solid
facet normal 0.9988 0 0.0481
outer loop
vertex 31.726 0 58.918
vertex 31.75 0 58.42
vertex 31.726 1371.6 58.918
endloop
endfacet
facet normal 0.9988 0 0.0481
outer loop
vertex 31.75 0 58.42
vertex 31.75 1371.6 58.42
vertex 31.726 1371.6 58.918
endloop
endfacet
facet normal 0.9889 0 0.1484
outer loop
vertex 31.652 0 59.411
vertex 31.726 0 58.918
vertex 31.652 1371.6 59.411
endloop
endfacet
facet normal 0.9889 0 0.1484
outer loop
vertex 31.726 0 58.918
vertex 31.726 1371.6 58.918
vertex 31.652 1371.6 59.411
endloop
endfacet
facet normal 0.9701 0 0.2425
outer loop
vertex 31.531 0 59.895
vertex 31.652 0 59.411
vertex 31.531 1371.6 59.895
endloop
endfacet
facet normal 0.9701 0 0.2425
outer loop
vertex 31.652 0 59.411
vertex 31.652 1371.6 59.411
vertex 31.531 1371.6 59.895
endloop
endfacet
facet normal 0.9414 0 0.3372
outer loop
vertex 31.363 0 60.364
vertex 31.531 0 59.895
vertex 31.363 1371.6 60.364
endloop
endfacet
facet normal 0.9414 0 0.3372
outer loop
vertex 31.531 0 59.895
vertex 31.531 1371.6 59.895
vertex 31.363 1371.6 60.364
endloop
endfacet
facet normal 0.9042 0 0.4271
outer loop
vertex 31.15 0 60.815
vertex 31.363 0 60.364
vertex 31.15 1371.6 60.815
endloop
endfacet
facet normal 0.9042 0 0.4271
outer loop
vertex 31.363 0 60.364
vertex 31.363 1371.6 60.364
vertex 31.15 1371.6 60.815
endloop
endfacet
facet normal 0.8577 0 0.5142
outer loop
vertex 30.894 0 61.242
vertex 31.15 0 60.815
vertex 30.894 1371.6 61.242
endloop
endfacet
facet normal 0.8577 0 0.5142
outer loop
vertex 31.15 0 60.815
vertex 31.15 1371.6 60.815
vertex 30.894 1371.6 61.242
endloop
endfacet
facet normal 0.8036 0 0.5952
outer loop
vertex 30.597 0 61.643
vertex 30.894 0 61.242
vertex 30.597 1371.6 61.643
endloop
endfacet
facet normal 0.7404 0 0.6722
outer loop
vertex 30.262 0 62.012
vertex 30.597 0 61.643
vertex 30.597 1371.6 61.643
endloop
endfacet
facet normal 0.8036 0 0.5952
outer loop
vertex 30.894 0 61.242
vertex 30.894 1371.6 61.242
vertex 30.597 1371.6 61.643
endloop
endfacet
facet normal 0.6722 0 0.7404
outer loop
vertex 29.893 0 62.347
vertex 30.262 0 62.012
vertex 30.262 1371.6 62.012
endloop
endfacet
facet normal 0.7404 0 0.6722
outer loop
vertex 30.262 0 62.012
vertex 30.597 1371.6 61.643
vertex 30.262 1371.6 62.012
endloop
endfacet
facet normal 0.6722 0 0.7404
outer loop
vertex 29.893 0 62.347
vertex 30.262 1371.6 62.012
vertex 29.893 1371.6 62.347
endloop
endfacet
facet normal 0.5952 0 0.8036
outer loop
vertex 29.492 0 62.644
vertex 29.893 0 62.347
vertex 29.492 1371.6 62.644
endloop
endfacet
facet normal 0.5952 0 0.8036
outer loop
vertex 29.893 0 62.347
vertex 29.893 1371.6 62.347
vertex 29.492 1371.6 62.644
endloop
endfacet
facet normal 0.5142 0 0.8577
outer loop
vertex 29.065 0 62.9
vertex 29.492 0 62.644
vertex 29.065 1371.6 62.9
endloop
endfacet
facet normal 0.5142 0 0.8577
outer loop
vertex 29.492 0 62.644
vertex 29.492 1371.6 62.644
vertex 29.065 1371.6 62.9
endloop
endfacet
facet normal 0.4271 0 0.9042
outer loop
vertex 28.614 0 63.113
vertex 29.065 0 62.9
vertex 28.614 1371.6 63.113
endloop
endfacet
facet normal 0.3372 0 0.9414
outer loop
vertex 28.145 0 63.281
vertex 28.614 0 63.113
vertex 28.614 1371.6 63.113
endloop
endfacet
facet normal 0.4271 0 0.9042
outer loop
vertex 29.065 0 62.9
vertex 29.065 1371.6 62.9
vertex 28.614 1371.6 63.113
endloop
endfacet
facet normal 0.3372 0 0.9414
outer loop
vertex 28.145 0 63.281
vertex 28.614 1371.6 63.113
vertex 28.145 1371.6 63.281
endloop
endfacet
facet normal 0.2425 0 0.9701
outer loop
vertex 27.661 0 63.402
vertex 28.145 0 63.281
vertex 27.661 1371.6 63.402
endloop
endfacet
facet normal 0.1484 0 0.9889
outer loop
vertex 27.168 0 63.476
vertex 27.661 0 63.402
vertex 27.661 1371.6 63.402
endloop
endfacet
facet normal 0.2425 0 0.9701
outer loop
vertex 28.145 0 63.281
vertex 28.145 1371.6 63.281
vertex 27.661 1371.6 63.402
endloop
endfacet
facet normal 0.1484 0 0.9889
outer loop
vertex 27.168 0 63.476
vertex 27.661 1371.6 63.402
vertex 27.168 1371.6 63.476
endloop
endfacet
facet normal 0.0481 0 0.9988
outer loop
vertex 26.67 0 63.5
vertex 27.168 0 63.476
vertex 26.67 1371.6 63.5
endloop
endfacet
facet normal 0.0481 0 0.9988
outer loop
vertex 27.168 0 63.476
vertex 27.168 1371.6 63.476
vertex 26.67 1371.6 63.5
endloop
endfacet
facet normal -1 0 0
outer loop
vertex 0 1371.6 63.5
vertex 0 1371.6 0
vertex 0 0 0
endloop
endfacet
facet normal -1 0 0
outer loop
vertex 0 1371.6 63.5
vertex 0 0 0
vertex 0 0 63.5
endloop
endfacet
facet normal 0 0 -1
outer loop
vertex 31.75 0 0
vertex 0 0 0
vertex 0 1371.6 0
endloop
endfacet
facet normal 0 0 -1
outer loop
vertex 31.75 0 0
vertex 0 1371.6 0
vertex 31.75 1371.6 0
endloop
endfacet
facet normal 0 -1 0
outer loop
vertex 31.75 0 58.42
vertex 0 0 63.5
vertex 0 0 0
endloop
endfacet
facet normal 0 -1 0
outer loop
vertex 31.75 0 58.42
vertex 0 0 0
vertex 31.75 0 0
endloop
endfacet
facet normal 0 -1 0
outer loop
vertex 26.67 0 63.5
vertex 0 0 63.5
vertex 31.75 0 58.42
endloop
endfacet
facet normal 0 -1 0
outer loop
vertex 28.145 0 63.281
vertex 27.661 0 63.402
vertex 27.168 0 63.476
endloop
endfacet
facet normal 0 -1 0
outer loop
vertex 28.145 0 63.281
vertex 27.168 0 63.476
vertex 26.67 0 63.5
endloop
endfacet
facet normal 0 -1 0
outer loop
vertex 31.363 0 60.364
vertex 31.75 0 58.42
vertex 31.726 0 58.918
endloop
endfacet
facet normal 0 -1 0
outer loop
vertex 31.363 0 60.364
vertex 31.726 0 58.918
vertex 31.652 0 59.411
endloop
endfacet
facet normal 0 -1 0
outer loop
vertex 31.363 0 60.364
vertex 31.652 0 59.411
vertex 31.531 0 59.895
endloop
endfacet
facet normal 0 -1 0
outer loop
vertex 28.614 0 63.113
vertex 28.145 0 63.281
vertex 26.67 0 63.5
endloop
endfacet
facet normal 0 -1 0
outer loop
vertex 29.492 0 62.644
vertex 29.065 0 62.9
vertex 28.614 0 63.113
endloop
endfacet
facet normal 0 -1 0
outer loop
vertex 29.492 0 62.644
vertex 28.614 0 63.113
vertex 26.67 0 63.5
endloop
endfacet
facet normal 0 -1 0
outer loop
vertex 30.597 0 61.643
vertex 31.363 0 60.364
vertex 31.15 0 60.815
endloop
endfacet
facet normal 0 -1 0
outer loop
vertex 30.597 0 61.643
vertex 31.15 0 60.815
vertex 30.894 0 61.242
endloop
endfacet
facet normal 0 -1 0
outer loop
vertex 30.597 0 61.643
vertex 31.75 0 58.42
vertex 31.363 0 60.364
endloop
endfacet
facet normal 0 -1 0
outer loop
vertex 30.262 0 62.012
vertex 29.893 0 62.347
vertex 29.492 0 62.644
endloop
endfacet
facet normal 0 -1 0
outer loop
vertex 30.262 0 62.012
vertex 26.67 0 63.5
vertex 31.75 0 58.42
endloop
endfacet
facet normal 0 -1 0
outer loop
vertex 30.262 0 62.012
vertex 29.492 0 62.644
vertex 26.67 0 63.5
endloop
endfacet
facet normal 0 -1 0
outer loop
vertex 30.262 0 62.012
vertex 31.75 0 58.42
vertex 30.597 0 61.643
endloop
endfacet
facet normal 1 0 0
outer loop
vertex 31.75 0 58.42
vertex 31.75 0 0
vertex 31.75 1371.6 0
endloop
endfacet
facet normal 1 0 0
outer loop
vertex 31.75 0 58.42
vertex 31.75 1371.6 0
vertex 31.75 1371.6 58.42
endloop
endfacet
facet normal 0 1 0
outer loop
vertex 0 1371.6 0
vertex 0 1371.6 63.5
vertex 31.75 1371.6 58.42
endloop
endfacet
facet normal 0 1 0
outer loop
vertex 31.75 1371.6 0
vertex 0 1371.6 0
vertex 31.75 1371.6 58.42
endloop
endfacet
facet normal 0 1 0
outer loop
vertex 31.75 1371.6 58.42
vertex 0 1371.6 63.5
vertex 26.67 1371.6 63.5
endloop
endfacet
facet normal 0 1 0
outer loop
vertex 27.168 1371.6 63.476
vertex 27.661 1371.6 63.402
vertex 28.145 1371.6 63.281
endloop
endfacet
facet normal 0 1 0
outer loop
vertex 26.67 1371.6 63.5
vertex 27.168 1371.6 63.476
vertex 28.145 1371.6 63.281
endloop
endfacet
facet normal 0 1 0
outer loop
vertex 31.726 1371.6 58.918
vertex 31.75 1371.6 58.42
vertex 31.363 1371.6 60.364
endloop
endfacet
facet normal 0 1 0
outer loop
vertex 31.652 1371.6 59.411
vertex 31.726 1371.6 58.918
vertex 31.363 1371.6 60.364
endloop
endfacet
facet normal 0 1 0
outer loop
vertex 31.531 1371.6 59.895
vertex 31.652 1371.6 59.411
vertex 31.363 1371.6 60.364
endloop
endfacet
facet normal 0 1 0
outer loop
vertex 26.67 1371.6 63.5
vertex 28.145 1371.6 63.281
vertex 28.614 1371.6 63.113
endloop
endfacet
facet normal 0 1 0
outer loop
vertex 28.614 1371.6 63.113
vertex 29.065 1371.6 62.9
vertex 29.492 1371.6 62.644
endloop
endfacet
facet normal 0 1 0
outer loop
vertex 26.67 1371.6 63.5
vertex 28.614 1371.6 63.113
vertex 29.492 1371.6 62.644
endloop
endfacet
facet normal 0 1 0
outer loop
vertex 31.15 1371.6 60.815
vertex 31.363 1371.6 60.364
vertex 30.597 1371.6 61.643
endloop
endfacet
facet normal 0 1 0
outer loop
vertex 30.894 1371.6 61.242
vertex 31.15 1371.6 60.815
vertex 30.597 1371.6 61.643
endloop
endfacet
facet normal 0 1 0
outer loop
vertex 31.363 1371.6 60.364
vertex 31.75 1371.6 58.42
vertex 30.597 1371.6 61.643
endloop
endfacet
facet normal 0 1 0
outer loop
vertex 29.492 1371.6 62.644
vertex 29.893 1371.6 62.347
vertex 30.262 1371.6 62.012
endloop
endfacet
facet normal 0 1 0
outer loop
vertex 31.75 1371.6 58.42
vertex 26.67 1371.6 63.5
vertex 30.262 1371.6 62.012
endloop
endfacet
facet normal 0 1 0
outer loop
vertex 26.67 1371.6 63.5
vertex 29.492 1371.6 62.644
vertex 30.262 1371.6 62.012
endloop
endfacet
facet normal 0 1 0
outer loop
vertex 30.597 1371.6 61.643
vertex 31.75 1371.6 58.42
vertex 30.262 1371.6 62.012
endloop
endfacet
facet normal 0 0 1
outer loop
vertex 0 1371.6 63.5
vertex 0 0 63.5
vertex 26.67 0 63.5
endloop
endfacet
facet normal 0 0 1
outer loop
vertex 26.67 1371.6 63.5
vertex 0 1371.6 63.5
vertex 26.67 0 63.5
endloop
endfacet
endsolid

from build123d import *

# Parameters (mm, degrees)
F0_W     = 31.75
F0_H     = 63.5
F1_DEPTH = 1371.6
F2_R     = 5.08


with BuildPart() as f1:
    # F0 (on Front) → F1 (new body)
    with BuildSketch(Plane.XZ):
        with Locations((15.875, 31.75)):
            Rectangle(F0_W, F0_H)
    extrude(amount=-F1_DEPTH)

    # F2
    f2_edges = [f1.edges().sort_by_distance(p)[0] for p in [
        (31.75, 685.8, 63.5),
    ]]
    fillet(f2_edges, radius=F2_R)


solid = f1.part
